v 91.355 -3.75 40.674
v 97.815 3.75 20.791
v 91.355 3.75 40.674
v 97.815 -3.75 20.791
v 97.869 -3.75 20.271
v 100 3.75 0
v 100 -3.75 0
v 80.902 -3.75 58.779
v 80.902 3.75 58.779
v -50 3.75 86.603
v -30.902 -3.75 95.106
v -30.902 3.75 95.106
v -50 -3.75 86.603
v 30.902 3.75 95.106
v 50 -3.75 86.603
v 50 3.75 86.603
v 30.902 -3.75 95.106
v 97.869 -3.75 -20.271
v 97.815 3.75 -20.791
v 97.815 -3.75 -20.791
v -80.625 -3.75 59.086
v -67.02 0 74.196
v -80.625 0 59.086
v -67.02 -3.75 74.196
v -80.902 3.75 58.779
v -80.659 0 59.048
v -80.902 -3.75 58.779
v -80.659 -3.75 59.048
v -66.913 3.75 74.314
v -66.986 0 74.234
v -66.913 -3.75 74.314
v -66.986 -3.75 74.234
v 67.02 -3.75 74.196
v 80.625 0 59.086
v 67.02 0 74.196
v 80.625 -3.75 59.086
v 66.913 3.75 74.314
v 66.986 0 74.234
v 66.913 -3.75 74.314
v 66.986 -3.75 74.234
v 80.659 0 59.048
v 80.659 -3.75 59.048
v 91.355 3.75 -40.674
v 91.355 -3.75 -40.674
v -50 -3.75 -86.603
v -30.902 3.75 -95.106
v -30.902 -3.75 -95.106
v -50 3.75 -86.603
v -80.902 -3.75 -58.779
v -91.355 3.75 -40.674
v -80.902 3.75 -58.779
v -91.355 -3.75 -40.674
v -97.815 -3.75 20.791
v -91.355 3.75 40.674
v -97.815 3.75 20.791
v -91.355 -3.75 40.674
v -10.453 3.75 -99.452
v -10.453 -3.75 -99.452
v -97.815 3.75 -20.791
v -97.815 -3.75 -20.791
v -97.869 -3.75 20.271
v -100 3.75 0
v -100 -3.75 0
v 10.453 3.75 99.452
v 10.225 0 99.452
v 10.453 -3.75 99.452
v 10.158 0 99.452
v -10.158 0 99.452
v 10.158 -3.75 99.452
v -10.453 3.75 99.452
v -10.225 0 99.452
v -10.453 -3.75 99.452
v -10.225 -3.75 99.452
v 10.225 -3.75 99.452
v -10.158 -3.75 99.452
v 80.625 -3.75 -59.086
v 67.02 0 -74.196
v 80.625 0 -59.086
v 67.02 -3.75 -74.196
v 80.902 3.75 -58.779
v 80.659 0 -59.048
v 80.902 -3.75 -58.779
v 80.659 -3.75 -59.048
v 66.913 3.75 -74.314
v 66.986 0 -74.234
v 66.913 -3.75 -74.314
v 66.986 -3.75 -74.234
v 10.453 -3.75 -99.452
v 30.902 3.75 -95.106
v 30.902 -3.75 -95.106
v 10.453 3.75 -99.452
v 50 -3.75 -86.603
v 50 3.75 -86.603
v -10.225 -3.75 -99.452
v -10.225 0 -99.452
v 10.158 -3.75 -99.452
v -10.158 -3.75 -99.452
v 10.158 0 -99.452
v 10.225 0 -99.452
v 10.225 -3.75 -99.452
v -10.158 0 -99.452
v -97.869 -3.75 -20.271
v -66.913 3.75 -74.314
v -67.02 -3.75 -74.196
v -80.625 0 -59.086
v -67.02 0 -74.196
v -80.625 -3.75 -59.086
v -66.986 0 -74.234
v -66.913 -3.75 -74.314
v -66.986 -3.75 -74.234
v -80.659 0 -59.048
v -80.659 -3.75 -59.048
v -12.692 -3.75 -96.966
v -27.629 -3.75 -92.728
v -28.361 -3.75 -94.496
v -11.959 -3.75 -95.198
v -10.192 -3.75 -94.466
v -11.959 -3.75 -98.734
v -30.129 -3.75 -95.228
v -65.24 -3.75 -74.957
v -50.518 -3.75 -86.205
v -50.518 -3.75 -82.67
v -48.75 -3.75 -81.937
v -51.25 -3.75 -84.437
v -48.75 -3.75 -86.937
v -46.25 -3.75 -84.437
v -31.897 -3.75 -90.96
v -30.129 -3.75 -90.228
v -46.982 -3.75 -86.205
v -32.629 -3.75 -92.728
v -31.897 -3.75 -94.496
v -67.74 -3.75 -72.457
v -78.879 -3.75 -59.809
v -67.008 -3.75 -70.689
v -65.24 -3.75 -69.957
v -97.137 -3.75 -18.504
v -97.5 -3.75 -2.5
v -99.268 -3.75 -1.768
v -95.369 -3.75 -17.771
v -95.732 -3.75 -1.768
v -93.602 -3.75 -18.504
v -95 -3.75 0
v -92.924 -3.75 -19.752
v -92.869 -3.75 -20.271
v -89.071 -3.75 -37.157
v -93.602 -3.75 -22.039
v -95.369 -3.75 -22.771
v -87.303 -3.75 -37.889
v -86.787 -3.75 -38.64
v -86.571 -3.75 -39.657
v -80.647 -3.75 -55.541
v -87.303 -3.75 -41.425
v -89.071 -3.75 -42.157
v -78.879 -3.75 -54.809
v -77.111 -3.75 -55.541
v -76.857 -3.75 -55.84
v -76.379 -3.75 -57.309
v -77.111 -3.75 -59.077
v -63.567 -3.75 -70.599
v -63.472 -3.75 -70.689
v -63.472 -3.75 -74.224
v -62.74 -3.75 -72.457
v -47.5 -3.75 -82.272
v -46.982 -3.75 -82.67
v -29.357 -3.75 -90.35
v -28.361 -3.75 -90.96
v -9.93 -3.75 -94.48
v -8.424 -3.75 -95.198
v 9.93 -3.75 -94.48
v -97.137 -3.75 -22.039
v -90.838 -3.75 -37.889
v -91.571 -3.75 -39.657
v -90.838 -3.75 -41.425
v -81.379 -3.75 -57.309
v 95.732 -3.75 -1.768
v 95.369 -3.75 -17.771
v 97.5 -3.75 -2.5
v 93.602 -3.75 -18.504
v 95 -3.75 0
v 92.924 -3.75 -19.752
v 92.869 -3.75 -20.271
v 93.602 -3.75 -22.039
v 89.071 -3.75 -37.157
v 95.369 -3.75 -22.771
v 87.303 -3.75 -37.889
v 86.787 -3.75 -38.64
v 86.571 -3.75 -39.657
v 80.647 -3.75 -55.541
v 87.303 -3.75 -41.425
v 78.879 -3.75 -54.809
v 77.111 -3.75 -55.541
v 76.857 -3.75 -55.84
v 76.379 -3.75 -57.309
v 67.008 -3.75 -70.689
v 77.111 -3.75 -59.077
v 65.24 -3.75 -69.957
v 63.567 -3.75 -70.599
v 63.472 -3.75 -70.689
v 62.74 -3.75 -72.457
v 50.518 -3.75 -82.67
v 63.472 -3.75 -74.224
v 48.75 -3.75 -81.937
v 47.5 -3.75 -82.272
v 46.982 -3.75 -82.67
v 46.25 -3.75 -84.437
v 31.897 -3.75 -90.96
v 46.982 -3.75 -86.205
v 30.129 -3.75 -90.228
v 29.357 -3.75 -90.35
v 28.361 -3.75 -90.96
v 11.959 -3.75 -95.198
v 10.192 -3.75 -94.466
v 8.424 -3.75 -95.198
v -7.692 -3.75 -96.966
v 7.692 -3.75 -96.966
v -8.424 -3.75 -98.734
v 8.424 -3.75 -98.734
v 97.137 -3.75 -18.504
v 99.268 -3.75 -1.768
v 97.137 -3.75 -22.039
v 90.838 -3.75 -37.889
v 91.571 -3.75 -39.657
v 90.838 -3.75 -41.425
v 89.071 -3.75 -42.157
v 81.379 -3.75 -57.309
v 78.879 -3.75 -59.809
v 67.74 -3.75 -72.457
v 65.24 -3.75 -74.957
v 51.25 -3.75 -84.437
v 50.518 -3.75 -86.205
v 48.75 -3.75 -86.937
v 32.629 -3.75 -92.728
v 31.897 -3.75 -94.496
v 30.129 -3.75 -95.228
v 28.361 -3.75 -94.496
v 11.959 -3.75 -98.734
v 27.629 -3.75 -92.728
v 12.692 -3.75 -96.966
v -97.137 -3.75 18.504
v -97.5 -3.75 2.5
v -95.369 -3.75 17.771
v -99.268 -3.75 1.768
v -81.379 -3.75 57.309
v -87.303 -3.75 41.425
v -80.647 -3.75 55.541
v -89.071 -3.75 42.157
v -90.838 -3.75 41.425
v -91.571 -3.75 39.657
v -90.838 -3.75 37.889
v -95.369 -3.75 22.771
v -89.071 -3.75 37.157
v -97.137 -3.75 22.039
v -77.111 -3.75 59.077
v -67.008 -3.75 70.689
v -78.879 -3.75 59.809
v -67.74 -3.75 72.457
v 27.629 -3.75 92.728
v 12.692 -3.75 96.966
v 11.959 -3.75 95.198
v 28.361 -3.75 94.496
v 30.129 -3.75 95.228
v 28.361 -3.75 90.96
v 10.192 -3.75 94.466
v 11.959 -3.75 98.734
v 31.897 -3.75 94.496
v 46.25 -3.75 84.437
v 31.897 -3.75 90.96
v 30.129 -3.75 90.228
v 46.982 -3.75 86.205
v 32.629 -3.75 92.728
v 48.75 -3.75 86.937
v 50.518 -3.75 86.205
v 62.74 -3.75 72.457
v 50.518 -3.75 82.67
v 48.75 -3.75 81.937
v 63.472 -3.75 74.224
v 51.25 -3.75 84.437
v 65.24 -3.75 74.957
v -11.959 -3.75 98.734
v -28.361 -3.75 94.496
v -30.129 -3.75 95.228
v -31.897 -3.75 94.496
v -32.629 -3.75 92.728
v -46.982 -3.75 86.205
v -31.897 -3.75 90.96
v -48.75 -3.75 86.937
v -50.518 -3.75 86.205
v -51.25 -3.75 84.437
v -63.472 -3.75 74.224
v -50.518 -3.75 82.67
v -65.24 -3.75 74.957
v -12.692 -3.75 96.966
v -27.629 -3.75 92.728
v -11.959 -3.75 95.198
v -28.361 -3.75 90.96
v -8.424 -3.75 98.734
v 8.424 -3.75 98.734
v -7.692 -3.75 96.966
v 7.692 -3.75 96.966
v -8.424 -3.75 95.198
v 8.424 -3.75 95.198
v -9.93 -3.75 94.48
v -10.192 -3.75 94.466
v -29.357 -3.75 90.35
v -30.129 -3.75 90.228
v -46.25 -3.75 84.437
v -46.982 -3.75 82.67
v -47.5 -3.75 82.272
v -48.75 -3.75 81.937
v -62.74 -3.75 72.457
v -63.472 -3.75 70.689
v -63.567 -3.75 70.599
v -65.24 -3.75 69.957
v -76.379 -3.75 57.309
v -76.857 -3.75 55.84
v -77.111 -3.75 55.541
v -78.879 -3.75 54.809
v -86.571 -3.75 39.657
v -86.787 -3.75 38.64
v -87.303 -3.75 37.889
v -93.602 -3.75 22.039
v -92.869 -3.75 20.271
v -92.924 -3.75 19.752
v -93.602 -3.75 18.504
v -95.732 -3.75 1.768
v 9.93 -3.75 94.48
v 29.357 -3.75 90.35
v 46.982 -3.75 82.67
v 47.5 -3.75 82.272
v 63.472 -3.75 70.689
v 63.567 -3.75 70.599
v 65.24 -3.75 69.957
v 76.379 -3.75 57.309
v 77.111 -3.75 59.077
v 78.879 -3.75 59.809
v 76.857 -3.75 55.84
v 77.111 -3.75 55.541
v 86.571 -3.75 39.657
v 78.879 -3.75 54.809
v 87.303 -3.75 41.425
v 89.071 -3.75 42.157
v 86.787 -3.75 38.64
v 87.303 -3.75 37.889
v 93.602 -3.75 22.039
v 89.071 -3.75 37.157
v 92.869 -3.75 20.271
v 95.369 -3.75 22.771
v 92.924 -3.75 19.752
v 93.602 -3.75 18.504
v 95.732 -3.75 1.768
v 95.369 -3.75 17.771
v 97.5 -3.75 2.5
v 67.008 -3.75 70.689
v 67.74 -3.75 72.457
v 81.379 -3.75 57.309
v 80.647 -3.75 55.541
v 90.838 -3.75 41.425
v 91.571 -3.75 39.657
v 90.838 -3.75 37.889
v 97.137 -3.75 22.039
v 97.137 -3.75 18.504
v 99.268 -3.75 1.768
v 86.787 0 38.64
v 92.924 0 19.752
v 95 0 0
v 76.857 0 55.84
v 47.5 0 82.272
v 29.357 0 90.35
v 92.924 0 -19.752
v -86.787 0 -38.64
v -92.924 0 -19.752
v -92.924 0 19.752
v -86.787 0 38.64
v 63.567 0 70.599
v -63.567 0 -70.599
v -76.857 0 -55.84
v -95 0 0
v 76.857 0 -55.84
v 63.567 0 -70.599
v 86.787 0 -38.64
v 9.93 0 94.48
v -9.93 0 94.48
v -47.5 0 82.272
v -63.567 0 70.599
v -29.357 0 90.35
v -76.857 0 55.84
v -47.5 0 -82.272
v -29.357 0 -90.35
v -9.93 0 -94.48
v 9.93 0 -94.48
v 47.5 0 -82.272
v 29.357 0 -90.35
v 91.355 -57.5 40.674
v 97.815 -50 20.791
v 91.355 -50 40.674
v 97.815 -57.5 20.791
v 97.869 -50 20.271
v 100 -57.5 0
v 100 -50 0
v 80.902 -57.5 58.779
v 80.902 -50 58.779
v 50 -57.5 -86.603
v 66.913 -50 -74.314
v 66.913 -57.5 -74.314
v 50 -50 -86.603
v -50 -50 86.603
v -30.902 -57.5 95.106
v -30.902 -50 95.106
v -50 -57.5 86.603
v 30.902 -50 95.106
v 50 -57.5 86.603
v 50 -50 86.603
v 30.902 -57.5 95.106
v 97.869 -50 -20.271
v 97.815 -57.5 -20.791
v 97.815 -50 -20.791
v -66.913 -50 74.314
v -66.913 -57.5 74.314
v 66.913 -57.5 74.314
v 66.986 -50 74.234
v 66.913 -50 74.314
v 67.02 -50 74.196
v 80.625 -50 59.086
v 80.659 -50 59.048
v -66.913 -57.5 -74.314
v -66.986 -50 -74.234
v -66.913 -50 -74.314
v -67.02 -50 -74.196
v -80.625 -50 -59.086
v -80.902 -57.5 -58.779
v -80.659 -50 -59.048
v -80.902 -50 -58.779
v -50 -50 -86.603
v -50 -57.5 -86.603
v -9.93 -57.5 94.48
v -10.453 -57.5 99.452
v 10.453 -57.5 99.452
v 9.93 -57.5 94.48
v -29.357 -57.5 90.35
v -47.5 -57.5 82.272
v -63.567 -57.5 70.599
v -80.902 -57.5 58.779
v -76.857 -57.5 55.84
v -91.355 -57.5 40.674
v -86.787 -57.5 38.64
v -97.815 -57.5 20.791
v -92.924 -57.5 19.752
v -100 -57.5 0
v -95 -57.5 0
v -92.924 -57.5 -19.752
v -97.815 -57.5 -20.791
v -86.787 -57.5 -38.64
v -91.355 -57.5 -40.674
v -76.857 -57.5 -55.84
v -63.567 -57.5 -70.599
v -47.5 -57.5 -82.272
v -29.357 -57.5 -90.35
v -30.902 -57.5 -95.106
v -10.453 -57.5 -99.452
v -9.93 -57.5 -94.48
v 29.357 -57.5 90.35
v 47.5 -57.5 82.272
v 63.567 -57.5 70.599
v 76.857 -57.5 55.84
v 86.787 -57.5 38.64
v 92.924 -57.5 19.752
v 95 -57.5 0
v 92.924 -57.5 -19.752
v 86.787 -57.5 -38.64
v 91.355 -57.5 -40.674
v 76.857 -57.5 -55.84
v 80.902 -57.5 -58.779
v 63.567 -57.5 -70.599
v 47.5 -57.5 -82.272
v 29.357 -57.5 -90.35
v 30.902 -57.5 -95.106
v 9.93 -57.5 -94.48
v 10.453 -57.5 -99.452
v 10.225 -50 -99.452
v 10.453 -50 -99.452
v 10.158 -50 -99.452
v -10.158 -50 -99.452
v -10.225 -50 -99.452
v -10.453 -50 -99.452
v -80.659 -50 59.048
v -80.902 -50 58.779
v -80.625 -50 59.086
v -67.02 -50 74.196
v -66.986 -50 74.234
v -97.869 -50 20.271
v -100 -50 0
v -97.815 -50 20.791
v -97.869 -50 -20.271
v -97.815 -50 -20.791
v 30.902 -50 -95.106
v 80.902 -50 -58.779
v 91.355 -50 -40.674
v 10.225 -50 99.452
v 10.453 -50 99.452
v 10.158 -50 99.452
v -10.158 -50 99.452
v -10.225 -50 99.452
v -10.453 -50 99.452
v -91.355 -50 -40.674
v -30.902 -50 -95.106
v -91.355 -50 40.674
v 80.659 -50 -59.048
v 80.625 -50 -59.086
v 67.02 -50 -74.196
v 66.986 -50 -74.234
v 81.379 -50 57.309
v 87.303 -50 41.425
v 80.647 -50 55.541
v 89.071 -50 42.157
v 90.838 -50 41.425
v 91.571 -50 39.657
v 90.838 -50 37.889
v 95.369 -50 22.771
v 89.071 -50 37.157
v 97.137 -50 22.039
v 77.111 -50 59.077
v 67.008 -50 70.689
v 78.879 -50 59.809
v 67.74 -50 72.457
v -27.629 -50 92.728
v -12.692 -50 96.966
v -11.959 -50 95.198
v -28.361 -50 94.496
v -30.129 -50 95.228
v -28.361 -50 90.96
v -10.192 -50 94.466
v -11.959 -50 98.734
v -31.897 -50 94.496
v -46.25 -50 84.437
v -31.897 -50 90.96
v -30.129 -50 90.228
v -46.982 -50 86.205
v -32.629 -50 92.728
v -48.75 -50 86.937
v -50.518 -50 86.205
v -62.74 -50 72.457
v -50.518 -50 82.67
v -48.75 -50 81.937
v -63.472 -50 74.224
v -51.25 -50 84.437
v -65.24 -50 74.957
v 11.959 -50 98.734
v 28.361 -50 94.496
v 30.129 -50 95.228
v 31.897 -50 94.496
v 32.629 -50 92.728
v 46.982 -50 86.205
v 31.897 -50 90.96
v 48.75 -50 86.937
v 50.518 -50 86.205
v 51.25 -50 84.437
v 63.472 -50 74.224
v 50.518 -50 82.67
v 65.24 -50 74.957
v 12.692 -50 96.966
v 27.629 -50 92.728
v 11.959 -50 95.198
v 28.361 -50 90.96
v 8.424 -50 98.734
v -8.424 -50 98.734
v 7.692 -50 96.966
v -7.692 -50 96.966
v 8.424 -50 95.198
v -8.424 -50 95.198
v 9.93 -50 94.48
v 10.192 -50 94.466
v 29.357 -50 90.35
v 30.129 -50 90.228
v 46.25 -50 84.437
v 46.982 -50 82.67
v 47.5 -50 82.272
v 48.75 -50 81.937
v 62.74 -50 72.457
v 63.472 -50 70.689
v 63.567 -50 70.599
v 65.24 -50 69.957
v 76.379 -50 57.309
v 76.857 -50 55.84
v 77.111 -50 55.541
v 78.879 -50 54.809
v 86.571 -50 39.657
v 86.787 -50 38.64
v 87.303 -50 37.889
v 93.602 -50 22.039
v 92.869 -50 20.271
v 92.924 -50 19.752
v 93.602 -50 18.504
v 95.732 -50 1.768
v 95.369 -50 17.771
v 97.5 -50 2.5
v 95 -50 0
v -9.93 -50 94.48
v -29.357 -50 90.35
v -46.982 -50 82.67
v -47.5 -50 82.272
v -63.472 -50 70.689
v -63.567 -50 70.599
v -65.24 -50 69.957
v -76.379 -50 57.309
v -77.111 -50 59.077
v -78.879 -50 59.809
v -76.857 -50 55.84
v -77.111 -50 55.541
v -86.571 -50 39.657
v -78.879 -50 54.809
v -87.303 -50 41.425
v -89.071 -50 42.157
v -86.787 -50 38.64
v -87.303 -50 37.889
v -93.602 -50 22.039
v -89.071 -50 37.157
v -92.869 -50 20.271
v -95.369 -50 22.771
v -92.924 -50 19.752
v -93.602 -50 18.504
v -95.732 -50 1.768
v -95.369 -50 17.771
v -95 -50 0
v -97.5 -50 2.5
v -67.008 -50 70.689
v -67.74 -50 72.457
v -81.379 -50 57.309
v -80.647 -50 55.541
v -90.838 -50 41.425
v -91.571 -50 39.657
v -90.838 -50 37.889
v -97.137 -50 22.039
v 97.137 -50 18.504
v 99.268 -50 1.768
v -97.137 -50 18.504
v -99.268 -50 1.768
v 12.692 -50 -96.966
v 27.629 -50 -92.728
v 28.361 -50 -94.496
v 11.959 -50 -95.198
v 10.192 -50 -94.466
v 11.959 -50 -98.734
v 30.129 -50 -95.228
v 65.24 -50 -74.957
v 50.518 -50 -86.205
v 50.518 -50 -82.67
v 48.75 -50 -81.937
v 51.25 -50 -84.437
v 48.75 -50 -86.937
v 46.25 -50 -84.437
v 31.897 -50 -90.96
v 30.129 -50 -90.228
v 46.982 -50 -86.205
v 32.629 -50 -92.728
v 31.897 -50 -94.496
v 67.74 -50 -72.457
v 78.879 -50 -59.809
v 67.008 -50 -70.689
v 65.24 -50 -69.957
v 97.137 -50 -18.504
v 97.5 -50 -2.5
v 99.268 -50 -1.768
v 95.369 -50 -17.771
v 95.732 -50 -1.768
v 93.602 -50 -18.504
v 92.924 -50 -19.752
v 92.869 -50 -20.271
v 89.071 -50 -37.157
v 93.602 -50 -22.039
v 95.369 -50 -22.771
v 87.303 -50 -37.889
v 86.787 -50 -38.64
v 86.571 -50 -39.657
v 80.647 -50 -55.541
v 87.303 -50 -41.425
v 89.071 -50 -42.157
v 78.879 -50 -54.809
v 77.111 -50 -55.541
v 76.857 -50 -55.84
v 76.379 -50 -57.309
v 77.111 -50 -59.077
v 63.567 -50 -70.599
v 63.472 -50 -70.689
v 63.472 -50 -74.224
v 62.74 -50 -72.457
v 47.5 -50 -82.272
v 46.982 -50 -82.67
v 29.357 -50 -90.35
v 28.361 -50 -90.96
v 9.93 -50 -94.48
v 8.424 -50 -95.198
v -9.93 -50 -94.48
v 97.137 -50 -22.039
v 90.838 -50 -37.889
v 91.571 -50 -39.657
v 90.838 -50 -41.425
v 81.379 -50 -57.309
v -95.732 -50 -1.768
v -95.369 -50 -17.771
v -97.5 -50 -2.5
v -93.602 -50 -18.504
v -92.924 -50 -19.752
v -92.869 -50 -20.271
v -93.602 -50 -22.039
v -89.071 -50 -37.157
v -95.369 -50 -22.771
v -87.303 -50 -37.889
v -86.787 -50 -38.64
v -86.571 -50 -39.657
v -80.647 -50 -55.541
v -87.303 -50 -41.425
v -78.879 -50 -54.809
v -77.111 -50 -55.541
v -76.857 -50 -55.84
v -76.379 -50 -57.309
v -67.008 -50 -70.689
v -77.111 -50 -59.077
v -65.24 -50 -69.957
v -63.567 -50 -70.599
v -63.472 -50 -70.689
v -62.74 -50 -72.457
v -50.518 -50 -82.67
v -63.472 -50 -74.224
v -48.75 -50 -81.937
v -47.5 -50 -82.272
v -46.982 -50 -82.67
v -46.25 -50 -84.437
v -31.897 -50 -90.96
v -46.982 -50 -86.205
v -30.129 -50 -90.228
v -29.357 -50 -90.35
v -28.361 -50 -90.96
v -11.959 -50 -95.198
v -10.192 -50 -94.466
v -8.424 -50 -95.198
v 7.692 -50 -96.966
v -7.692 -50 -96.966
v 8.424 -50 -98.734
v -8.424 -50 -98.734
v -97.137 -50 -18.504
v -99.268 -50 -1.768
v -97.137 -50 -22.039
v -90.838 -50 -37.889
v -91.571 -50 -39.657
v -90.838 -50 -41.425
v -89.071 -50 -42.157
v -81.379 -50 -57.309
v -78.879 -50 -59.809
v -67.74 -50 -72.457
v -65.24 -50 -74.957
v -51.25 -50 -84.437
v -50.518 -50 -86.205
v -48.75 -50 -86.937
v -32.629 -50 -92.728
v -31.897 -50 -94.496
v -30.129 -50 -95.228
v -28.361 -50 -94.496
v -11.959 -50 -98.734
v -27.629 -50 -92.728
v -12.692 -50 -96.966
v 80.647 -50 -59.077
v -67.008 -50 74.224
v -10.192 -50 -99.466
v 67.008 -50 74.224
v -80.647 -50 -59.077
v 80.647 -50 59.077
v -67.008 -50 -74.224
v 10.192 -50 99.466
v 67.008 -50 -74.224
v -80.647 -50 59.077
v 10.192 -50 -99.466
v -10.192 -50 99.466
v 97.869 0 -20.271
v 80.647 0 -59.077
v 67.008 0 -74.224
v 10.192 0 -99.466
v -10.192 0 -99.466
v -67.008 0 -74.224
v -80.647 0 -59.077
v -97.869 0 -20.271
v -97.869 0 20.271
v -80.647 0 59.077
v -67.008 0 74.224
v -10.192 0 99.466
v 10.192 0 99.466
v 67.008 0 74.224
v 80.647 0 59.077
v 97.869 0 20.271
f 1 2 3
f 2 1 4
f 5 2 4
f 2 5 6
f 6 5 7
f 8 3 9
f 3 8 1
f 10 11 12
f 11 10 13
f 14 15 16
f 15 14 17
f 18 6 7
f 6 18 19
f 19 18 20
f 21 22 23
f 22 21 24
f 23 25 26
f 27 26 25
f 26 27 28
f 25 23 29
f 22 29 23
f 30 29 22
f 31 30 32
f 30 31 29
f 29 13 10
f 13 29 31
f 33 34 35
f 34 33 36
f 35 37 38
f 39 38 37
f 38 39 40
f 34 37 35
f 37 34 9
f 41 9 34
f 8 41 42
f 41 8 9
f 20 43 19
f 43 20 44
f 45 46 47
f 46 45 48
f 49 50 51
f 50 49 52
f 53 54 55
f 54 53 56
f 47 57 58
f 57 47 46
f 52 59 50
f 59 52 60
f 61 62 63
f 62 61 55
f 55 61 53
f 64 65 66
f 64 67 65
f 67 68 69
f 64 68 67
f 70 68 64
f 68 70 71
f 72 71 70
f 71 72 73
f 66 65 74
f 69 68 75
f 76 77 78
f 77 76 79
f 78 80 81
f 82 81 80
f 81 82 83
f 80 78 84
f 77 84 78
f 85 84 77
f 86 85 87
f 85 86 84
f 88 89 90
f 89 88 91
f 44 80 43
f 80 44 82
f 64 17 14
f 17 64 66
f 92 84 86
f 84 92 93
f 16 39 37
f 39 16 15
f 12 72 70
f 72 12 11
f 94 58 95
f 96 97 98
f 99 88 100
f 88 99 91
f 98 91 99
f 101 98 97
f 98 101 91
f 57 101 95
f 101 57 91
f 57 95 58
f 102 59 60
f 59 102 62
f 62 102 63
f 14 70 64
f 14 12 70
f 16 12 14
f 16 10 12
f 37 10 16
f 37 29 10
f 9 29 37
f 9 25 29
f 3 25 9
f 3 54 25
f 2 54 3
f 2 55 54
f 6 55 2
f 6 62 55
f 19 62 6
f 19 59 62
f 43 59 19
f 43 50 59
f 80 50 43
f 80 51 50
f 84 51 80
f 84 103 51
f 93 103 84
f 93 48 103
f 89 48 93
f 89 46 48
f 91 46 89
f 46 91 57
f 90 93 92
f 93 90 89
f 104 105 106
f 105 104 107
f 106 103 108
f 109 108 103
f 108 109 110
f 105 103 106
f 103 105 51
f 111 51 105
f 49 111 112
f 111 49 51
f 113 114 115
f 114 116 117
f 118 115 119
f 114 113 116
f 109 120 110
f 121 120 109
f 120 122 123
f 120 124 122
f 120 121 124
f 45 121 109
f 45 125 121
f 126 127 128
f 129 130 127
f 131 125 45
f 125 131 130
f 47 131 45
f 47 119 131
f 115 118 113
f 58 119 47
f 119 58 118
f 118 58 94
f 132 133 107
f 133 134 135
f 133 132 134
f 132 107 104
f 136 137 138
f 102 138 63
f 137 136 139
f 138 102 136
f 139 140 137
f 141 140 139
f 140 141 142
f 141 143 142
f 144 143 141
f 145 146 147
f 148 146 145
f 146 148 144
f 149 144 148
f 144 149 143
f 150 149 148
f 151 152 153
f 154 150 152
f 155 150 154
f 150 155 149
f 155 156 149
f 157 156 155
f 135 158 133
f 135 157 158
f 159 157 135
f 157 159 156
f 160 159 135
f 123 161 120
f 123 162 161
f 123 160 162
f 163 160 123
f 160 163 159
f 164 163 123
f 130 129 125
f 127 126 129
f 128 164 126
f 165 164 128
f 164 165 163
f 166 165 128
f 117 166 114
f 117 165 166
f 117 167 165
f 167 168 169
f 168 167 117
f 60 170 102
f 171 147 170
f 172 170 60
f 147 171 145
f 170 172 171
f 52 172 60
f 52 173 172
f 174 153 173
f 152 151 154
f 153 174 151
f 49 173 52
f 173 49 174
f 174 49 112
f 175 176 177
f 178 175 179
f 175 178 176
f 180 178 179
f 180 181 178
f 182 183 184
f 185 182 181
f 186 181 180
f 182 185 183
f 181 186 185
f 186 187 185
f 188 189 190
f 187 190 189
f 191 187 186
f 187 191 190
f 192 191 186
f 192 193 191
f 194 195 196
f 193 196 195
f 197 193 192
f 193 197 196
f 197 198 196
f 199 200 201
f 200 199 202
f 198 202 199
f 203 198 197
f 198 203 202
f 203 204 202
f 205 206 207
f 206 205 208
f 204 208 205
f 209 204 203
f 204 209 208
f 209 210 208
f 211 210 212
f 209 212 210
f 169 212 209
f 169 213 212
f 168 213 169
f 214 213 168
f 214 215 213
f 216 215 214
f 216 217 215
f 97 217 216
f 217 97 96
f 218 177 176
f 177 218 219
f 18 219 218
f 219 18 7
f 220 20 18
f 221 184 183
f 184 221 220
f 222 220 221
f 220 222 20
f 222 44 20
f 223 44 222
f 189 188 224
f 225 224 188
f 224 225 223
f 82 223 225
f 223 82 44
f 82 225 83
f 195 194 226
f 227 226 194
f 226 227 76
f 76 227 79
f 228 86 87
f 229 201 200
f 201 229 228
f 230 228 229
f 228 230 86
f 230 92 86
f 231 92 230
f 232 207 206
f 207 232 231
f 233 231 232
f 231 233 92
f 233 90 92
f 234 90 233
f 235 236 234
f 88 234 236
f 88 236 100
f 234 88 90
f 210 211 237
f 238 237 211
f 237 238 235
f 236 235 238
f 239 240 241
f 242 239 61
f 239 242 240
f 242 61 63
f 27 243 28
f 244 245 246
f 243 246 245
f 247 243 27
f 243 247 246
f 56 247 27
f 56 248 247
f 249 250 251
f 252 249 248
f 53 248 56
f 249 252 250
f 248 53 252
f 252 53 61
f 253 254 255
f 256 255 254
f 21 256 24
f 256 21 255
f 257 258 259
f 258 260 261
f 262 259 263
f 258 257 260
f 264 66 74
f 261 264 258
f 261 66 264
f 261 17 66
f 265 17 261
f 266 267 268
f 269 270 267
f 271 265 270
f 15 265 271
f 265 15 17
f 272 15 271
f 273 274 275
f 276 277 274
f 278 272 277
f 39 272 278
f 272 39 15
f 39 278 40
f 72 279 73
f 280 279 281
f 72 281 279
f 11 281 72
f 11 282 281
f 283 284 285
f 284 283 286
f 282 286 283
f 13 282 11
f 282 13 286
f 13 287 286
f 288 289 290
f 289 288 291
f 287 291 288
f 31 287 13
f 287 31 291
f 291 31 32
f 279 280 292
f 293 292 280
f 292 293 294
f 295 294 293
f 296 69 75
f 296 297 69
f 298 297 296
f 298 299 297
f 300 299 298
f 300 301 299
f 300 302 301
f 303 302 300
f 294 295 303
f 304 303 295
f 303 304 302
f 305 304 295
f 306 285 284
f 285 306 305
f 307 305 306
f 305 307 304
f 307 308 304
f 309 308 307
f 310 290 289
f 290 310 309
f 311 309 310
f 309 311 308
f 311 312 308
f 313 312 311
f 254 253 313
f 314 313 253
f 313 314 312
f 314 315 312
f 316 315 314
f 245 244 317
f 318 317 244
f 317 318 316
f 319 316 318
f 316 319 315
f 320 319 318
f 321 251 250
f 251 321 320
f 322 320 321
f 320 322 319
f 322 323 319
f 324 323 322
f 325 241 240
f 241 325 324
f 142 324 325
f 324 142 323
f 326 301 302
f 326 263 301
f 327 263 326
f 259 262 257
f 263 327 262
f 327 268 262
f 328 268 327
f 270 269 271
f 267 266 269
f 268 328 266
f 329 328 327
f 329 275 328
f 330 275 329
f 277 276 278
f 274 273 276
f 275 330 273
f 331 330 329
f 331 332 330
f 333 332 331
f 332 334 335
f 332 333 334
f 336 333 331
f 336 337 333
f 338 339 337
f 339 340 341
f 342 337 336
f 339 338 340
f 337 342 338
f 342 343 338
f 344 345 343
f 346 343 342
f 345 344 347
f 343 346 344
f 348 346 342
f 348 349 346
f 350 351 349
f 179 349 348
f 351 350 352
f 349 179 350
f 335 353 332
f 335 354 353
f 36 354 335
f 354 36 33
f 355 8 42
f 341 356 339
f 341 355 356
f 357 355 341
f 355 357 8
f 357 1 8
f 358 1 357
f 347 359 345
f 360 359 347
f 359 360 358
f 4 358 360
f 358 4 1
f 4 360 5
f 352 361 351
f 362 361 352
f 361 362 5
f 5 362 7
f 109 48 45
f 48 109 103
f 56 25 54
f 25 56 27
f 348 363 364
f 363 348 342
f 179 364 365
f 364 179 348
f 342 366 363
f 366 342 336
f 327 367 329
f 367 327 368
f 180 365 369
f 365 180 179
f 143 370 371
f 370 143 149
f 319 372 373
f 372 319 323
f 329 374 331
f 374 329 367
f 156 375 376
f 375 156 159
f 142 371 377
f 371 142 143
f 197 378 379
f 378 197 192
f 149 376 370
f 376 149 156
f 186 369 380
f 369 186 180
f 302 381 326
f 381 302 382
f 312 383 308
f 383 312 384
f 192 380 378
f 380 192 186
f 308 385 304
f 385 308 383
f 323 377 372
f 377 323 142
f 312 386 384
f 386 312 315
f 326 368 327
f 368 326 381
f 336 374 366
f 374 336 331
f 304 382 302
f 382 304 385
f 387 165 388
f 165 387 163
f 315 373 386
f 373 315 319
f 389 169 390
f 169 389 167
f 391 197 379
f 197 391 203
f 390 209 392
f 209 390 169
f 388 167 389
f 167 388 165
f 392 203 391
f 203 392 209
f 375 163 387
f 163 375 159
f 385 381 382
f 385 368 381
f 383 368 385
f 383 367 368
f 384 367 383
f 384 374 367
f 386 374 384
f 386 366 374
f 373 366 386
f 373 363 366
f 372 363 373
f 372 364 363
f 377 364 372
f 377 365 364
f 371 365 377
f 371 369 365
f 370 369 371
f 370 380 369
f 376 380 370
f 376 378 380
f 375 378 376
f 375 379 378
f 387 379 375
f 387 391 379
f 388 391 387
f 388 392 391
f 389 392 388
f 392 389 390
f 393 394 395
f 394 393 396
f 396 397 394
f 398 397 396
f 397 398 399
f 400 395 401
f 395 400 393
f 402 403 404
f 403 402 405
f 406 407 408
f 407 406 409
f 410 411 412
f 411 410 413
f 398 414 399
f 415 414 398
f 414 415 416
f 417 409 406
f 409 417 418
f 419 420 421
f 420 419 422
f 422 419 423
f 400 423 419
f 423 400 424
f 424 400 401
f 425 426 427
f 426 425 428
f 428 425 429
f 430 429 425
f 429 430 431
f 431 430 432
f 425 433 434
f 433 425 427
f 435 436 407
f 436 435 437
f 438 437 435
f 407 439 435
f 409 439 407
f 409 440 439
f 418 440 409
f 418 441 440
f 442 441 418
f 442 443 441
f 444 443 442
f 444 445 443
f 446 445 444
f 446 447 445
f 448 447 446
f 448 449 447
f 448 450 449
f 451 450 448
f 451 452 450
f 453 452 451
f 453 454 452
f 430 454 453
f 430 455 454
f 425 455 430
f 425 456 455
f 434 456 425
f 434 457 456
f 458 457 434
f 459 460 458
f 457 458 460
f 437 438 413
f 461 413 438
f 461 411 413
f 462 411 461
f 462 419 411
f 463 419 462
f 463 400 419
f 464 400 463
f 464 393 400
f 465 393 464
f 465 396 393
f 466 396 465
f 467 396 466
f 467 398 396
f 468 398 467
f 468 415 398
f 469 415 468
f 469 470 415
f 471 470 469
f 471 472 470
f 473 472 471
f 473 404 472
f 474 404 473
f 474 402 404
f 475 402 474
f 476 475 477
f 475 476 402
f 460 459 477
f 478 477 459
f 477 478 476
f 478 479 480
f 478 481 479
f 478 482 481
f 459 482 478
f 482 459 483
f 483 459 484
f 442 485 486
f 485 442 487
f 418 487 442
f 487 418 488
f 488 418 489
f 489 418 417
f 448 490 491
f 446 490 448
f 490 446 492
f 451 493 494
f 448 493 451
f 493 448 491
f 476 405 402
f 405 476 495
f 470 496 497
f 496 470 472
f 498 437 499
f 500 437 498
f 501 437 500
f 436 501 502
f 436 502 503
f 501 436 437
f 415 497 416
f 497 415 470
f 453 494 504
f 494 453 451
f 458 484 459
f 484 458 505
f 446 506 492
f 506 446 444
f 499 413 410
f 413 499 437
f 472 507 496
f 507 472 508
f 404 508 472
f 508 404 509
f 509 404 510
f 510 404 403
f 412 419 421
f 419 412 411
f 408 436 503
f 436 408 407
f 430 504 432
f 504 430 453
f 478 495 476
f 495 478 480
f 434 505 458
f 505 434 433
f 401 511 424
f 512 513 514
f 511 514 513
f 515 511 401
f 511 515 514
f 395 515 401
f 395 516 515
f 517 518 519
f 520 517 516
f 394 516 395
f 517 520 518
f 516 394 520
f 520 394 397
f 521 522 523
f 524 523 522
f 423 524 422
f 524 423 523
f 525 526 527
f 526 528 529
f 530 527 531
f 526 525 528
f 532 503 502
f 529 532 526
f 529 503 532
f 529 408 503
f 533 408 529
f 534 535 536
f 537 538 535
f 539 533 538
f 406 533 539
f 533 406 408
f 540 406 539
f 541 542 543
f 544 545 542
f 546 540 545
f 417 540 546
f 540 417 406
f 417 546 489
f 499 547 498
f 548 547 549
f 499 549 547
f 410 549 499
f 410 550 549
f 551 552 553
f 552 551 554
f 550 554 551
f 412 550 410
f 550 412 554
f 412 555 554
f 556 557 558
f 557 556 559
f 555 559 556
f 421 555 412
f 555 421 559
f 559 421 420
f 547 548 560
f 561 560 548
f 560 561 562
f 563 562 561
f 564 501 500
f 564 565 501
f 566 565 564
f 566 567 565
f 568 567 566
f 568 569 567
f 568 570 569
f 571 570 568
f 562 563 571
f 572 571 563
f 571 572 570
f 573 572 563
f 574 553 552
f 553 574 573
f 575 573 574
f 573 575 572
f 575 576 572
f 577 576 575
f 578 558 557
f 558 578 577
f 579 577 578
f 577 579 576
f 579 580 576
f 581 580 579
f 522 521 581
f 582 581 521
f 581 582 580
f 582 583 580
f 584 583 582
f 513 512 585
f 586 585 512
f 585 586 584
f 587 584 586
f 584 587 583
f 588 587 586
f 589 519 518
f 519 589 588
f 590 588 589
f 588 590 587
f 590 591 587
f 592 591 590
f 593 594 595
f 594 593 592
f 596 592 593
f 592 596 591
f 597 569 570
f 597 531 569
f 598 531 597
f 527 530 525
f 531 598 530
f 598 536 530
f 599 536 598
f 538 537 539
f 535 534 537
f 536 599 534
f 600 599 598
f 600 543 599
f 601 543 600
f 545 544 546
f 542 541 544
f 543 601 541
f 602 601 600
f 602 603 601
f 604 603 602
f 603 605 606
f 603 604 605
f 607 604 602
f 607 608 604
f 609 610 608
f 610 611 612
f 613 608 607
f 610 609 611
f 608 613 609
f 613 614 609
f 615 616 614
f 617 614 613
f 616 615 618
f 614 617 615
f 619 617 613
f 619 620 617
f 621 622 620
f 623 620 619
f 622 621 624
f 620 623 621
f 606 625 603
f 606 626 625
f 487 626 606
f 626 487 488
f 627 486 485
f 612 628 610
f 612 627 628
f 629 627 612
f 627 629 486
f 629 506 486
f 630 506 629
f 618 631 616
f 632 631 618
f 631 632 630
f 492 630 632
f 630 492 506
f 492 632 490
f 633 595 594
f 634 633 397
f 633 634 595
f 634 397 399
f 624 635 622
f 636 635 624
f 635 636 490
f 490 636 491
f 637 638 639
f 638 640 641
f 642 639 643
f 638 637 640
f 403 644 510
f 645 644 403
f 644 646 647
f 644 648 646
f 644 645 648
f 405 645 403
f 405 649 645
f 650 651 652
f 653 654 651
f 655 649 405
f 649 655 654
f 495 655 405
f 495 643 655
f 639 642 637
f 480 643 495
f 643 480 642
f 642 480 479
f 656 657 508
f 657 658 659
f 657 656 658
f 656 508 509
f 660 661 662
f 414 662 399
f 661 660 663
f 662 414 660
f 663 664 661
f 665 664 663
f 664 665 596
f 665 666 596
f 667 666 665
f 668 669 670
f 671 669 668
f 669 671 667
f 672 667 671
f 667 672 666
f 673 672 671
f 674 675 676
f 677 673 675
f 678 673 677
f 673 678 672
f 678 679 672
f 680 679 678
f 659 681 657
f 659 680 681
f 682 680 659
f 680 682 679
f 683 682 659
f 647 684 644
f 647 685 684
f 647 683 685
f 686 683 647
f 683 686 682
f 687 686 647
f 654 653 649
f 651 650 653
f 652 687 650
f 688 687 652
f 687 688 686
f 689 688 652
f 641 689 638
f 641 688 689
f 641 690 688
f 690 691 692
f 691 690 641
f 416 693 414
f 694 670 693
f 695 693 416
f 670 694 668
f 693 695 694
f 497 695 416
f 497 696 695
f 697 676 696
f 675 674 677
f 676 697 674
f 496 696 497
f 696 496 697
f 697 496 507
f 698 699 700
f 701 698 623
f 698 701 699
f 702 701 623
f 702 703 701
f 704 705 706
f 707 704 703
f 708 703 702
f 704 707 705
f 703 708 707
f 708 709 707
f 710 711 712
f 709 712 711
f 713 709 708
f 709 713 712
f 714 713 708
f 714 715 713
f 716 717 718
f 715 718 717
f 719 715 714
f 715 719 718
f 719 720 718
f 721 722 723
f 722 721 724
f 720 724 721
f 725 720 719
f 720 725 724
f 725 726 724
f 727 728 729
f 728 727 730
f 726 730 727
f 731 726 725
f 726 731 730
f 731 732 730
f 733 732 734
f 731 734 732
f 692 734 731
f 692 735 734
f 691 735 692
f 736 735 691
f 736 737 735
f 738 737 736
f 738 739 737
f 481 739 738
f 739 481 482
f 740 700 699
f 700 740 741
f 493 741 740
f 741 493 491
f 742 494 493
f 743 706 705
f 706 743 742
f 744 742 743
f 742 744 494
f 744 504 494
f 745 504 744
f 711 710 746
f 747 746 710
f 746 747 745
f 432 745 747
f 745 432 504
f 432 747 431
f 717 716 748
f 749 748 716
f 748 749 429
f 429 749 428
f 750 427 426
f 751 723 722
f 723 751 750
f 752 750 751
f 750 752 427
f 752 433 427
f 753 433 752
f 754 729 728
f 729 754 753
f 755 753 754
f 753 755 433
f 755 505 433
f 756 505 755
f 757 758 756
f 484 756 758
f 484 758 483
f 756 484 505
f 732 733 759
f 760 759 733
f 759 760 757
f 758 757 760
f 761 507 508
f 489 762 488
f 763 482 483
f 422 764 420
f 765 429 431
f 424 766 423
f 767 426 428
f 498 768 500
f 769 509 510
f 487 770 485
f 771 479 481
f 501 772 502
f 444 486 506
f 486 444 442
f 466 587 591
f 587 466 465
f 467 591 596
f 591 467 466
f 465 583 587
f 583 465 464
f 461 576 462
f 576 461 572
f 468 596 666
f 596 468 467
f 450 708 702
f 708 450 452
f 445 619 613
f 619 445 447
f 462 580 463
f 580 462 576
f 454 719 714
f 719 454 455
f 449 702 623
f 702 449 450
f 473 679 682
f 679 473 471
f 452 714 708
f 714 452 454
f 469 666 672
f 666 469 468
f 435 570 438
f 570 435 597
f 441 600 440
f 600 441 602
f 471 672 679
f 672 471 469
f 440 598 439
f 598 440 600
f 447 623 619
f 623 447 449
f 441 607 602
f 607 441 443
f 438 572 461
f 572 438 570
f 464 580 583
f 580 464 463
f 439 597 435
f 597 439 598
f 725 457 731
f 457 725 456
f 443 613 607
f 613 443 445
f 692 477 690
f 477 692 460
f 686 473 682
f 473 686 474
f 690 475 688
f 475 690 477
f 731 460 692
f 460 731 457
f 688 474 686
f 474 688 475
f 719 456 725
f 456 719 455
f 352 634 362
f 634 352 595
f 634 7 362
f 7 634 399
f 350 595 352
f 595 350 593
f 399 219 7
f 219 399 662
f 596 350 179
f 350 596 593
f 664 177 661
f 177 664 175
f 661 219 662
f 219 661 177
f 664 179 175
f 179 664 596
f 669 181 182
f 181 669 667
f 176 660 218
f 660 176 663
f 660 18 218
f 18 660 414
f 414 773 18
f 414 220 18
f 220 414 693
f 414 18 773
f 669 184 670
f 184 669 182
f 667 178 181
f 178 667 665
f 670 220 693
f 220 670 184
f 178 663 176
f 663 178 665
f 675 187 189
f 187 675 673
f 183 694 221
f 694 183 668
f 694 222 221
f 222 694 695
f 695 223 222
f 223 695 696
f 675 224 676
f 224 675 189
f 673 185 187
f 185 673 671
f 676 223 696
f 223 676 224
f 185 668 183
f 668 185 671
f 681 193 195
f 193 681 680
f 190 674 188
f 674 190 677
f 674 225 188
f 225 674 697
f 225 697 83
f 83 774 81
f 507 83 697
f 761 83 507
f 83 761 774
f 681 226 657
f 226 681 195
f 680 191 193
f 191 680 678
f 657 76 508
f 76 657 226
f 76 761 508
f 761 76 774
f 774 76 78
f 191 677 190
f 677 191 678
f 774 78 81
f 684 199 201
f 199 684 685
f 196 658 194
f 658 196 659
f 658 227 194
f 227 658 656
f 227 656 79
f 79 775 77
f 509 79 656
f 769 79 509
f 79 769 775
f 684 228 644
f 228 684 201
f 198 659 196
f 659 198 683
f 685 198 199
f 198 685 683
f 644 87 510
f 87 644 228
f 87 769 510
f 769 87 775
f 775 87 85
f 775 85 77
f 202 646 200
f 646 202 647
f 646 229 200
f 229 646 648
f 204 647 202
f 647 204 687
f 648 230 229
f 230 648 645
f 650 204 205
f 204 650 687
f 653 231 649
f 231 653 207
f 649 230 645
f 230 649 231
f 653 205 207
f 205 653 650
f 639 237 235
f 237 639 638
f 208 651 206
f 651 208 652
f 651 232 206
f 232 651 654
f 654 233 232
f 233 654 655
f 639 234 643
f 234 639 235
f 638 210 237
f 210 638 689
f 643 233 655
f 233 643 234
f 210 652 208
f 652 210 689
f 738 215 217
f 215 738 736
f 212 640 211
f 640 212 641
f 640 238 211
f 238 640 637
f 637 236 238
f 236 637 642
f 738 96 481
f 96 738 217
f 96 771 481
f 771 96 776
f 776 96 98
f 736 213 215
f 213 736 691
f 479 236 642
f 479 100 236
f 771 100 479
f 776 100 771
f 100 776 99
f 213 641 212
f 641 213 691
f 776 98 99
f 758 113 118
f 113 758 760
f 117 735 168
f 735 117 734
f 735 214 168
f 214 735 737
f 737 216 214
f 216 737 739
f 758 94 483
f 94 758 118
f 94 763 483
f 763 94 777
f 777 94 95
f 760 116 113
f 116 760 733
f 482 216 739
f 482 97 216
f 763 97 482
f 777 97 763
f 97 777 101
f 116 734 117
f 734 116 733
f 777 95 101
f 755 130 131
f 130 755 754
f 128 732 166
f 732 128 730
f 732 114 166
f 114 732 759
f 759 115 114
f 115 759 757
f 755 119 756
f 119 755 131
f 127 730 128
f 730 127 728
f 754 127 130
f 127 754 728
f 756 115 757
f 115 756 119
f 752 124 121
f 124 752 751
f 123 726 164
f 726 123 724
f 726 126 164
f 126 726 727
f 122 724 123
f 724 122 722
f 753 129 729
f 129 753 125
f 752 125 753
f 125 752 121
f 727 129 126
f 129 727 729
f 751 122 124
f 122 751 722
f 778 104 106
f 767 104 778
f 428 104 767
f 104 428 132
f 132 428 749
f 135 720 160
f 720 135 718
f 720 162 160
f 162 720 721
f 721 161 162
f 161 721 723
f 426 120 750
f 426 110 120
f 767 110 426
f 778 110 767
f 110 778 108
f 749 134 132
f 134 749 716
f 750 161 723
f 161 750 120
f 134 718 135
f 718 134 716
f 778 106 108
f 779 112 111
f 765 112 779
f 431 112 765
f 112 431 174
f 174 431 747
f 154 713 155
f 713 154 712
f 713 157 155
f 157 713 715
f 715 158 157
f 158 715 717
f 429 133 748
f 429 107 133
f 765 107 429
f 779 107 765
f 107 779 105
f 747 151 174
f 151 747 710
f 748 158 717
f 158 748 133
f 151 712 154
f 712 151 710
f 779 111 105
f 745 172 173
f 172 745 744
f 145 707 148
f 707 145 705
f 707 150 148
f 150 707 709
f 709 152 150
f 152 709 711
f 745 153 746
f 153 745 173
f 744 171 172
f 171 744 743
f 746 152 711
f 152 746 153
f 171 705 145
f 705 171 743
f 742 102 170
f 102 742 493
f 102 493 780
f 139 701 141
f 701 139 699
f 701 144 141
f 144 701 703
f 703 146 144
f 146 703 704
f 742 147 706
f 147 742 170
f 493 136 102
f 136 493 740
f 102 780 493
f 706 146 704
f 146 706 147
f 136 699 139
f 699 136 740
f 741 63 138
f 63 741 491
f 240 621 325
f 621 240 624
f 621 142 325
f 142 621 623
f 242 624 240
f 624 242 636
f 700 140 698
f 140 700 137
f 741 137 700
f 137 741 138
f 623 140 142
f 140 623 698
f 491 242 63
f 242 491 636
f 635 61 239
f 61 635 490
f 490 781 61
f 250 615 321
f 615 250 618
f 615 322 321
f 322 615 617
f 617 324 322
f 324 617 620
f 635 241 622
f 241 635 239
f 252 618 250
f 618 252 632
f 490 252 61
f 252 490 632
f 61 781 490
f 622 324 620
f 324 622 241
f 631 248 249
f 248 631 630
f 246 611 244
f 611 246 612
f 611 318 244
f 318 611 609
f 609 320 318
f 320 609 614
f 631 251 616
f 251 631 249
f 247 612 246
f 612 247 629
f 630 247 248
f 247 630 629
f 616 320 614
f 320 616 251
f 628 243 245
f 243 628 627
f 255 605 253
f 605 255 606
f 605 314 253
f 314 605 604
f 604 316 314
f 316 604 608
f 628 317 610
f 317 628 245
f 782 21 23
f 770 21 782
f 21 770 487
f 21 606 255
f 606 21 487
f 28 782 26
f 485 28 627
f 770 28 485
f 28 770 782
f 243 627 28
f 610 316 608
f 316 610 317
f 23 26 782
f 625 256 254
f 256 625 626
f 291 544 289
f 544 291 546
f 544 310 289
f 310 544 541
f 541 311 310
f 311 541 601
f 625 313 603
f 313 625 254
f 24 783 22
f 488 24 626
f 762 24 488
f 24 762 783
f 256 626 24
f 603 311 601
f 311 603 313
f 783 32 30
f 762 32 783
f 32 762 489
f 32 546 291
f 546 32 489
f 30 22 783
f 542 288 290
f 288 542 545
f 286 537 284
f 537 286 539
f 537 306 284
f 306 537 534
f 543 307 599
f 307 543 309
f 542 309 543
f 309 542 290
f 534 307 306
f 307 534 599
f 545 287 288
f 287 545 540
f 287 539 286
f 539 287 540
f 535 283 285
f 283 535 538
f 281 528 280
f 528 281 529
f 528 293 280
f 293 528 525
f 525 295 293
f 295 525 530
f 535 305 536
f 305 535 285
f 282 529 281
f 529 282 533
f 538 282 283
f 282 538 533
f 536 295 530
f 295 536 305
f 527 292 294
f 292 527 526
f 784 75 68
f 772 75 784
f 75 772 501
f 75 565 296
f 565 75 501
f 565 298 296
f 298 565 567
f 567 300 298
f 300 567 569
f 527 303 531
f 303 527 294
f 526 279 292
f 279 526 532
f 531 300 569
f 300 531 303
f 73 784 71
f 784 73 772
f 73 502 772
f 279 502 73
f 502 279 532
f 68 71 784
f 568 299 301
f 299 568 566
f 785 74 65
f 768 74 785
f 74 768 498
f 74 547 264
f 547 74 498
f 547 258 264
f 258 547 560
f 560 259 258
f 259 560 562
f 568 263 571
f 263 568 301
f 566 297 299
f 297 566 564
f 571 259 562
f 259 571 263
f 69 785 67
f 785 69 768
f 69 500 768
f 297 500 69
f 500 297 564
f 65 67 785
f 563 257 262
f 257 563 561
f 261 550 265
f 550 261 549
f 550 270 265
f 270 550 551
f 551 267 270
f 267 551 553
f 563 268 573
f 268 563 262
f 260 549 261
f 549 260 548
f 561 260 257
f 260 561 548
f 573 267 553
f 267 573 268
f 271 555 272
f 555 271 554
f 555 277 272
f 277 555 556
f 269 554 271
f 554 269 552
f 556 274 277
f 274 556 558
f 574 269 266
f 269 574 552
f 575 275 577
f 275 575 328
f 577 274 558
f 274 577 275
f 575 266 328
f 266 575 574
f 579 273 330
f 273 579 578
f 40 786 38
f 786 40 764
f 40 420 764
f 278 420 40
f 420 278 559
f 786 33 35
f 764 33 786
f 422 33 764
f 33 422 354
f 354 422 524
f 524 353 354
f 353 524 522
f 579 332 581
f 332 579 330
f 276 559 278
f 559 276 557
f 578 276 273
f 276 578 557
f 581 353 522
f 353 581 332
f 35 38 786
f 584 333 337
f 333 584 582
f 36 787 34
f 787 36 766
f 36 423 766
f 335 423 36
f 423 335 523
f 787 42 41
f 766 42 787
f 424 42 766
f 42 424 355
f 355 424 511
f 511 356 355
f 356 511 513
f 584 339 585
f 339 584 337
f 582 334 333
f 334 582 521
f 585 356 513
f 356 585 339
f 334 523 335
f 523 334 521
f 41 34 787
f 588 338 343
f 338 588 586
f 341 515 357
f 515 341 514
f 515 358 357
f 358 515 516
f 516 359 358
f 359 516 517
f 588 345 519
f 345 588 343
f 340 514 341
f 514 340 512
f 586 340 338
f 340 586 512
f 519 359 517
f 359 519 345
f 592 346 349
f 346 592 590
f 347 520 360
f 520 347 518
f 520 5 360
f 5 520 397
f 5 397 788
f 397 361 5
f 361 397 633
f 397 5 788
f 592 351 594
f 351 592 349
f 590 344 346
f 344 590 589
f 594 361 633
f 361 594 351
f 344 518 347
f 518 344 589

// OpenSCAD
//vars
wheelThickness = 7.5;
barDiameter = 5;
barLenght = 50;
// alterable 
wheelRadius = 100;
barAmount = 30;

barSpacing = wheelRadius / barAmount;

module wheel(){
//    make wheel bases
    difference(){
        cylinder(wheelThickness, wheelRadius, wheelRadius, center=true);
        cylinder(wheelThickness, (wheelRadius - barDiameter), (wheelRadius - barDiameter));
    }
    translate([0, 0, barLenght])
        difference(){
        cylinder(wheelThickness, wheelRadius, wheelRadius);
        cylinder(wheelThickness, (wheelRadius - barDiameter), (wheelRadius - barDiameter));
    }
    
//    add wheel bars
    union(){
     //making holders
        make_ring_of(wheelRadius, barAmount){ 
            cylinder(barLenght,d=barDiameter);
        }        
    }
}

rotate([90, 0, 0]){
    wheel();
}


module make_ring_of(wheelRadius, barAmount){
    for (a = [0 : barAmount - 1]) {
        angle = a * 360 / barAmount;
        translate((wheelRadius - barDiameter/2) * [cos(angle), -sin(angle), 0])
                children();
    }
}
